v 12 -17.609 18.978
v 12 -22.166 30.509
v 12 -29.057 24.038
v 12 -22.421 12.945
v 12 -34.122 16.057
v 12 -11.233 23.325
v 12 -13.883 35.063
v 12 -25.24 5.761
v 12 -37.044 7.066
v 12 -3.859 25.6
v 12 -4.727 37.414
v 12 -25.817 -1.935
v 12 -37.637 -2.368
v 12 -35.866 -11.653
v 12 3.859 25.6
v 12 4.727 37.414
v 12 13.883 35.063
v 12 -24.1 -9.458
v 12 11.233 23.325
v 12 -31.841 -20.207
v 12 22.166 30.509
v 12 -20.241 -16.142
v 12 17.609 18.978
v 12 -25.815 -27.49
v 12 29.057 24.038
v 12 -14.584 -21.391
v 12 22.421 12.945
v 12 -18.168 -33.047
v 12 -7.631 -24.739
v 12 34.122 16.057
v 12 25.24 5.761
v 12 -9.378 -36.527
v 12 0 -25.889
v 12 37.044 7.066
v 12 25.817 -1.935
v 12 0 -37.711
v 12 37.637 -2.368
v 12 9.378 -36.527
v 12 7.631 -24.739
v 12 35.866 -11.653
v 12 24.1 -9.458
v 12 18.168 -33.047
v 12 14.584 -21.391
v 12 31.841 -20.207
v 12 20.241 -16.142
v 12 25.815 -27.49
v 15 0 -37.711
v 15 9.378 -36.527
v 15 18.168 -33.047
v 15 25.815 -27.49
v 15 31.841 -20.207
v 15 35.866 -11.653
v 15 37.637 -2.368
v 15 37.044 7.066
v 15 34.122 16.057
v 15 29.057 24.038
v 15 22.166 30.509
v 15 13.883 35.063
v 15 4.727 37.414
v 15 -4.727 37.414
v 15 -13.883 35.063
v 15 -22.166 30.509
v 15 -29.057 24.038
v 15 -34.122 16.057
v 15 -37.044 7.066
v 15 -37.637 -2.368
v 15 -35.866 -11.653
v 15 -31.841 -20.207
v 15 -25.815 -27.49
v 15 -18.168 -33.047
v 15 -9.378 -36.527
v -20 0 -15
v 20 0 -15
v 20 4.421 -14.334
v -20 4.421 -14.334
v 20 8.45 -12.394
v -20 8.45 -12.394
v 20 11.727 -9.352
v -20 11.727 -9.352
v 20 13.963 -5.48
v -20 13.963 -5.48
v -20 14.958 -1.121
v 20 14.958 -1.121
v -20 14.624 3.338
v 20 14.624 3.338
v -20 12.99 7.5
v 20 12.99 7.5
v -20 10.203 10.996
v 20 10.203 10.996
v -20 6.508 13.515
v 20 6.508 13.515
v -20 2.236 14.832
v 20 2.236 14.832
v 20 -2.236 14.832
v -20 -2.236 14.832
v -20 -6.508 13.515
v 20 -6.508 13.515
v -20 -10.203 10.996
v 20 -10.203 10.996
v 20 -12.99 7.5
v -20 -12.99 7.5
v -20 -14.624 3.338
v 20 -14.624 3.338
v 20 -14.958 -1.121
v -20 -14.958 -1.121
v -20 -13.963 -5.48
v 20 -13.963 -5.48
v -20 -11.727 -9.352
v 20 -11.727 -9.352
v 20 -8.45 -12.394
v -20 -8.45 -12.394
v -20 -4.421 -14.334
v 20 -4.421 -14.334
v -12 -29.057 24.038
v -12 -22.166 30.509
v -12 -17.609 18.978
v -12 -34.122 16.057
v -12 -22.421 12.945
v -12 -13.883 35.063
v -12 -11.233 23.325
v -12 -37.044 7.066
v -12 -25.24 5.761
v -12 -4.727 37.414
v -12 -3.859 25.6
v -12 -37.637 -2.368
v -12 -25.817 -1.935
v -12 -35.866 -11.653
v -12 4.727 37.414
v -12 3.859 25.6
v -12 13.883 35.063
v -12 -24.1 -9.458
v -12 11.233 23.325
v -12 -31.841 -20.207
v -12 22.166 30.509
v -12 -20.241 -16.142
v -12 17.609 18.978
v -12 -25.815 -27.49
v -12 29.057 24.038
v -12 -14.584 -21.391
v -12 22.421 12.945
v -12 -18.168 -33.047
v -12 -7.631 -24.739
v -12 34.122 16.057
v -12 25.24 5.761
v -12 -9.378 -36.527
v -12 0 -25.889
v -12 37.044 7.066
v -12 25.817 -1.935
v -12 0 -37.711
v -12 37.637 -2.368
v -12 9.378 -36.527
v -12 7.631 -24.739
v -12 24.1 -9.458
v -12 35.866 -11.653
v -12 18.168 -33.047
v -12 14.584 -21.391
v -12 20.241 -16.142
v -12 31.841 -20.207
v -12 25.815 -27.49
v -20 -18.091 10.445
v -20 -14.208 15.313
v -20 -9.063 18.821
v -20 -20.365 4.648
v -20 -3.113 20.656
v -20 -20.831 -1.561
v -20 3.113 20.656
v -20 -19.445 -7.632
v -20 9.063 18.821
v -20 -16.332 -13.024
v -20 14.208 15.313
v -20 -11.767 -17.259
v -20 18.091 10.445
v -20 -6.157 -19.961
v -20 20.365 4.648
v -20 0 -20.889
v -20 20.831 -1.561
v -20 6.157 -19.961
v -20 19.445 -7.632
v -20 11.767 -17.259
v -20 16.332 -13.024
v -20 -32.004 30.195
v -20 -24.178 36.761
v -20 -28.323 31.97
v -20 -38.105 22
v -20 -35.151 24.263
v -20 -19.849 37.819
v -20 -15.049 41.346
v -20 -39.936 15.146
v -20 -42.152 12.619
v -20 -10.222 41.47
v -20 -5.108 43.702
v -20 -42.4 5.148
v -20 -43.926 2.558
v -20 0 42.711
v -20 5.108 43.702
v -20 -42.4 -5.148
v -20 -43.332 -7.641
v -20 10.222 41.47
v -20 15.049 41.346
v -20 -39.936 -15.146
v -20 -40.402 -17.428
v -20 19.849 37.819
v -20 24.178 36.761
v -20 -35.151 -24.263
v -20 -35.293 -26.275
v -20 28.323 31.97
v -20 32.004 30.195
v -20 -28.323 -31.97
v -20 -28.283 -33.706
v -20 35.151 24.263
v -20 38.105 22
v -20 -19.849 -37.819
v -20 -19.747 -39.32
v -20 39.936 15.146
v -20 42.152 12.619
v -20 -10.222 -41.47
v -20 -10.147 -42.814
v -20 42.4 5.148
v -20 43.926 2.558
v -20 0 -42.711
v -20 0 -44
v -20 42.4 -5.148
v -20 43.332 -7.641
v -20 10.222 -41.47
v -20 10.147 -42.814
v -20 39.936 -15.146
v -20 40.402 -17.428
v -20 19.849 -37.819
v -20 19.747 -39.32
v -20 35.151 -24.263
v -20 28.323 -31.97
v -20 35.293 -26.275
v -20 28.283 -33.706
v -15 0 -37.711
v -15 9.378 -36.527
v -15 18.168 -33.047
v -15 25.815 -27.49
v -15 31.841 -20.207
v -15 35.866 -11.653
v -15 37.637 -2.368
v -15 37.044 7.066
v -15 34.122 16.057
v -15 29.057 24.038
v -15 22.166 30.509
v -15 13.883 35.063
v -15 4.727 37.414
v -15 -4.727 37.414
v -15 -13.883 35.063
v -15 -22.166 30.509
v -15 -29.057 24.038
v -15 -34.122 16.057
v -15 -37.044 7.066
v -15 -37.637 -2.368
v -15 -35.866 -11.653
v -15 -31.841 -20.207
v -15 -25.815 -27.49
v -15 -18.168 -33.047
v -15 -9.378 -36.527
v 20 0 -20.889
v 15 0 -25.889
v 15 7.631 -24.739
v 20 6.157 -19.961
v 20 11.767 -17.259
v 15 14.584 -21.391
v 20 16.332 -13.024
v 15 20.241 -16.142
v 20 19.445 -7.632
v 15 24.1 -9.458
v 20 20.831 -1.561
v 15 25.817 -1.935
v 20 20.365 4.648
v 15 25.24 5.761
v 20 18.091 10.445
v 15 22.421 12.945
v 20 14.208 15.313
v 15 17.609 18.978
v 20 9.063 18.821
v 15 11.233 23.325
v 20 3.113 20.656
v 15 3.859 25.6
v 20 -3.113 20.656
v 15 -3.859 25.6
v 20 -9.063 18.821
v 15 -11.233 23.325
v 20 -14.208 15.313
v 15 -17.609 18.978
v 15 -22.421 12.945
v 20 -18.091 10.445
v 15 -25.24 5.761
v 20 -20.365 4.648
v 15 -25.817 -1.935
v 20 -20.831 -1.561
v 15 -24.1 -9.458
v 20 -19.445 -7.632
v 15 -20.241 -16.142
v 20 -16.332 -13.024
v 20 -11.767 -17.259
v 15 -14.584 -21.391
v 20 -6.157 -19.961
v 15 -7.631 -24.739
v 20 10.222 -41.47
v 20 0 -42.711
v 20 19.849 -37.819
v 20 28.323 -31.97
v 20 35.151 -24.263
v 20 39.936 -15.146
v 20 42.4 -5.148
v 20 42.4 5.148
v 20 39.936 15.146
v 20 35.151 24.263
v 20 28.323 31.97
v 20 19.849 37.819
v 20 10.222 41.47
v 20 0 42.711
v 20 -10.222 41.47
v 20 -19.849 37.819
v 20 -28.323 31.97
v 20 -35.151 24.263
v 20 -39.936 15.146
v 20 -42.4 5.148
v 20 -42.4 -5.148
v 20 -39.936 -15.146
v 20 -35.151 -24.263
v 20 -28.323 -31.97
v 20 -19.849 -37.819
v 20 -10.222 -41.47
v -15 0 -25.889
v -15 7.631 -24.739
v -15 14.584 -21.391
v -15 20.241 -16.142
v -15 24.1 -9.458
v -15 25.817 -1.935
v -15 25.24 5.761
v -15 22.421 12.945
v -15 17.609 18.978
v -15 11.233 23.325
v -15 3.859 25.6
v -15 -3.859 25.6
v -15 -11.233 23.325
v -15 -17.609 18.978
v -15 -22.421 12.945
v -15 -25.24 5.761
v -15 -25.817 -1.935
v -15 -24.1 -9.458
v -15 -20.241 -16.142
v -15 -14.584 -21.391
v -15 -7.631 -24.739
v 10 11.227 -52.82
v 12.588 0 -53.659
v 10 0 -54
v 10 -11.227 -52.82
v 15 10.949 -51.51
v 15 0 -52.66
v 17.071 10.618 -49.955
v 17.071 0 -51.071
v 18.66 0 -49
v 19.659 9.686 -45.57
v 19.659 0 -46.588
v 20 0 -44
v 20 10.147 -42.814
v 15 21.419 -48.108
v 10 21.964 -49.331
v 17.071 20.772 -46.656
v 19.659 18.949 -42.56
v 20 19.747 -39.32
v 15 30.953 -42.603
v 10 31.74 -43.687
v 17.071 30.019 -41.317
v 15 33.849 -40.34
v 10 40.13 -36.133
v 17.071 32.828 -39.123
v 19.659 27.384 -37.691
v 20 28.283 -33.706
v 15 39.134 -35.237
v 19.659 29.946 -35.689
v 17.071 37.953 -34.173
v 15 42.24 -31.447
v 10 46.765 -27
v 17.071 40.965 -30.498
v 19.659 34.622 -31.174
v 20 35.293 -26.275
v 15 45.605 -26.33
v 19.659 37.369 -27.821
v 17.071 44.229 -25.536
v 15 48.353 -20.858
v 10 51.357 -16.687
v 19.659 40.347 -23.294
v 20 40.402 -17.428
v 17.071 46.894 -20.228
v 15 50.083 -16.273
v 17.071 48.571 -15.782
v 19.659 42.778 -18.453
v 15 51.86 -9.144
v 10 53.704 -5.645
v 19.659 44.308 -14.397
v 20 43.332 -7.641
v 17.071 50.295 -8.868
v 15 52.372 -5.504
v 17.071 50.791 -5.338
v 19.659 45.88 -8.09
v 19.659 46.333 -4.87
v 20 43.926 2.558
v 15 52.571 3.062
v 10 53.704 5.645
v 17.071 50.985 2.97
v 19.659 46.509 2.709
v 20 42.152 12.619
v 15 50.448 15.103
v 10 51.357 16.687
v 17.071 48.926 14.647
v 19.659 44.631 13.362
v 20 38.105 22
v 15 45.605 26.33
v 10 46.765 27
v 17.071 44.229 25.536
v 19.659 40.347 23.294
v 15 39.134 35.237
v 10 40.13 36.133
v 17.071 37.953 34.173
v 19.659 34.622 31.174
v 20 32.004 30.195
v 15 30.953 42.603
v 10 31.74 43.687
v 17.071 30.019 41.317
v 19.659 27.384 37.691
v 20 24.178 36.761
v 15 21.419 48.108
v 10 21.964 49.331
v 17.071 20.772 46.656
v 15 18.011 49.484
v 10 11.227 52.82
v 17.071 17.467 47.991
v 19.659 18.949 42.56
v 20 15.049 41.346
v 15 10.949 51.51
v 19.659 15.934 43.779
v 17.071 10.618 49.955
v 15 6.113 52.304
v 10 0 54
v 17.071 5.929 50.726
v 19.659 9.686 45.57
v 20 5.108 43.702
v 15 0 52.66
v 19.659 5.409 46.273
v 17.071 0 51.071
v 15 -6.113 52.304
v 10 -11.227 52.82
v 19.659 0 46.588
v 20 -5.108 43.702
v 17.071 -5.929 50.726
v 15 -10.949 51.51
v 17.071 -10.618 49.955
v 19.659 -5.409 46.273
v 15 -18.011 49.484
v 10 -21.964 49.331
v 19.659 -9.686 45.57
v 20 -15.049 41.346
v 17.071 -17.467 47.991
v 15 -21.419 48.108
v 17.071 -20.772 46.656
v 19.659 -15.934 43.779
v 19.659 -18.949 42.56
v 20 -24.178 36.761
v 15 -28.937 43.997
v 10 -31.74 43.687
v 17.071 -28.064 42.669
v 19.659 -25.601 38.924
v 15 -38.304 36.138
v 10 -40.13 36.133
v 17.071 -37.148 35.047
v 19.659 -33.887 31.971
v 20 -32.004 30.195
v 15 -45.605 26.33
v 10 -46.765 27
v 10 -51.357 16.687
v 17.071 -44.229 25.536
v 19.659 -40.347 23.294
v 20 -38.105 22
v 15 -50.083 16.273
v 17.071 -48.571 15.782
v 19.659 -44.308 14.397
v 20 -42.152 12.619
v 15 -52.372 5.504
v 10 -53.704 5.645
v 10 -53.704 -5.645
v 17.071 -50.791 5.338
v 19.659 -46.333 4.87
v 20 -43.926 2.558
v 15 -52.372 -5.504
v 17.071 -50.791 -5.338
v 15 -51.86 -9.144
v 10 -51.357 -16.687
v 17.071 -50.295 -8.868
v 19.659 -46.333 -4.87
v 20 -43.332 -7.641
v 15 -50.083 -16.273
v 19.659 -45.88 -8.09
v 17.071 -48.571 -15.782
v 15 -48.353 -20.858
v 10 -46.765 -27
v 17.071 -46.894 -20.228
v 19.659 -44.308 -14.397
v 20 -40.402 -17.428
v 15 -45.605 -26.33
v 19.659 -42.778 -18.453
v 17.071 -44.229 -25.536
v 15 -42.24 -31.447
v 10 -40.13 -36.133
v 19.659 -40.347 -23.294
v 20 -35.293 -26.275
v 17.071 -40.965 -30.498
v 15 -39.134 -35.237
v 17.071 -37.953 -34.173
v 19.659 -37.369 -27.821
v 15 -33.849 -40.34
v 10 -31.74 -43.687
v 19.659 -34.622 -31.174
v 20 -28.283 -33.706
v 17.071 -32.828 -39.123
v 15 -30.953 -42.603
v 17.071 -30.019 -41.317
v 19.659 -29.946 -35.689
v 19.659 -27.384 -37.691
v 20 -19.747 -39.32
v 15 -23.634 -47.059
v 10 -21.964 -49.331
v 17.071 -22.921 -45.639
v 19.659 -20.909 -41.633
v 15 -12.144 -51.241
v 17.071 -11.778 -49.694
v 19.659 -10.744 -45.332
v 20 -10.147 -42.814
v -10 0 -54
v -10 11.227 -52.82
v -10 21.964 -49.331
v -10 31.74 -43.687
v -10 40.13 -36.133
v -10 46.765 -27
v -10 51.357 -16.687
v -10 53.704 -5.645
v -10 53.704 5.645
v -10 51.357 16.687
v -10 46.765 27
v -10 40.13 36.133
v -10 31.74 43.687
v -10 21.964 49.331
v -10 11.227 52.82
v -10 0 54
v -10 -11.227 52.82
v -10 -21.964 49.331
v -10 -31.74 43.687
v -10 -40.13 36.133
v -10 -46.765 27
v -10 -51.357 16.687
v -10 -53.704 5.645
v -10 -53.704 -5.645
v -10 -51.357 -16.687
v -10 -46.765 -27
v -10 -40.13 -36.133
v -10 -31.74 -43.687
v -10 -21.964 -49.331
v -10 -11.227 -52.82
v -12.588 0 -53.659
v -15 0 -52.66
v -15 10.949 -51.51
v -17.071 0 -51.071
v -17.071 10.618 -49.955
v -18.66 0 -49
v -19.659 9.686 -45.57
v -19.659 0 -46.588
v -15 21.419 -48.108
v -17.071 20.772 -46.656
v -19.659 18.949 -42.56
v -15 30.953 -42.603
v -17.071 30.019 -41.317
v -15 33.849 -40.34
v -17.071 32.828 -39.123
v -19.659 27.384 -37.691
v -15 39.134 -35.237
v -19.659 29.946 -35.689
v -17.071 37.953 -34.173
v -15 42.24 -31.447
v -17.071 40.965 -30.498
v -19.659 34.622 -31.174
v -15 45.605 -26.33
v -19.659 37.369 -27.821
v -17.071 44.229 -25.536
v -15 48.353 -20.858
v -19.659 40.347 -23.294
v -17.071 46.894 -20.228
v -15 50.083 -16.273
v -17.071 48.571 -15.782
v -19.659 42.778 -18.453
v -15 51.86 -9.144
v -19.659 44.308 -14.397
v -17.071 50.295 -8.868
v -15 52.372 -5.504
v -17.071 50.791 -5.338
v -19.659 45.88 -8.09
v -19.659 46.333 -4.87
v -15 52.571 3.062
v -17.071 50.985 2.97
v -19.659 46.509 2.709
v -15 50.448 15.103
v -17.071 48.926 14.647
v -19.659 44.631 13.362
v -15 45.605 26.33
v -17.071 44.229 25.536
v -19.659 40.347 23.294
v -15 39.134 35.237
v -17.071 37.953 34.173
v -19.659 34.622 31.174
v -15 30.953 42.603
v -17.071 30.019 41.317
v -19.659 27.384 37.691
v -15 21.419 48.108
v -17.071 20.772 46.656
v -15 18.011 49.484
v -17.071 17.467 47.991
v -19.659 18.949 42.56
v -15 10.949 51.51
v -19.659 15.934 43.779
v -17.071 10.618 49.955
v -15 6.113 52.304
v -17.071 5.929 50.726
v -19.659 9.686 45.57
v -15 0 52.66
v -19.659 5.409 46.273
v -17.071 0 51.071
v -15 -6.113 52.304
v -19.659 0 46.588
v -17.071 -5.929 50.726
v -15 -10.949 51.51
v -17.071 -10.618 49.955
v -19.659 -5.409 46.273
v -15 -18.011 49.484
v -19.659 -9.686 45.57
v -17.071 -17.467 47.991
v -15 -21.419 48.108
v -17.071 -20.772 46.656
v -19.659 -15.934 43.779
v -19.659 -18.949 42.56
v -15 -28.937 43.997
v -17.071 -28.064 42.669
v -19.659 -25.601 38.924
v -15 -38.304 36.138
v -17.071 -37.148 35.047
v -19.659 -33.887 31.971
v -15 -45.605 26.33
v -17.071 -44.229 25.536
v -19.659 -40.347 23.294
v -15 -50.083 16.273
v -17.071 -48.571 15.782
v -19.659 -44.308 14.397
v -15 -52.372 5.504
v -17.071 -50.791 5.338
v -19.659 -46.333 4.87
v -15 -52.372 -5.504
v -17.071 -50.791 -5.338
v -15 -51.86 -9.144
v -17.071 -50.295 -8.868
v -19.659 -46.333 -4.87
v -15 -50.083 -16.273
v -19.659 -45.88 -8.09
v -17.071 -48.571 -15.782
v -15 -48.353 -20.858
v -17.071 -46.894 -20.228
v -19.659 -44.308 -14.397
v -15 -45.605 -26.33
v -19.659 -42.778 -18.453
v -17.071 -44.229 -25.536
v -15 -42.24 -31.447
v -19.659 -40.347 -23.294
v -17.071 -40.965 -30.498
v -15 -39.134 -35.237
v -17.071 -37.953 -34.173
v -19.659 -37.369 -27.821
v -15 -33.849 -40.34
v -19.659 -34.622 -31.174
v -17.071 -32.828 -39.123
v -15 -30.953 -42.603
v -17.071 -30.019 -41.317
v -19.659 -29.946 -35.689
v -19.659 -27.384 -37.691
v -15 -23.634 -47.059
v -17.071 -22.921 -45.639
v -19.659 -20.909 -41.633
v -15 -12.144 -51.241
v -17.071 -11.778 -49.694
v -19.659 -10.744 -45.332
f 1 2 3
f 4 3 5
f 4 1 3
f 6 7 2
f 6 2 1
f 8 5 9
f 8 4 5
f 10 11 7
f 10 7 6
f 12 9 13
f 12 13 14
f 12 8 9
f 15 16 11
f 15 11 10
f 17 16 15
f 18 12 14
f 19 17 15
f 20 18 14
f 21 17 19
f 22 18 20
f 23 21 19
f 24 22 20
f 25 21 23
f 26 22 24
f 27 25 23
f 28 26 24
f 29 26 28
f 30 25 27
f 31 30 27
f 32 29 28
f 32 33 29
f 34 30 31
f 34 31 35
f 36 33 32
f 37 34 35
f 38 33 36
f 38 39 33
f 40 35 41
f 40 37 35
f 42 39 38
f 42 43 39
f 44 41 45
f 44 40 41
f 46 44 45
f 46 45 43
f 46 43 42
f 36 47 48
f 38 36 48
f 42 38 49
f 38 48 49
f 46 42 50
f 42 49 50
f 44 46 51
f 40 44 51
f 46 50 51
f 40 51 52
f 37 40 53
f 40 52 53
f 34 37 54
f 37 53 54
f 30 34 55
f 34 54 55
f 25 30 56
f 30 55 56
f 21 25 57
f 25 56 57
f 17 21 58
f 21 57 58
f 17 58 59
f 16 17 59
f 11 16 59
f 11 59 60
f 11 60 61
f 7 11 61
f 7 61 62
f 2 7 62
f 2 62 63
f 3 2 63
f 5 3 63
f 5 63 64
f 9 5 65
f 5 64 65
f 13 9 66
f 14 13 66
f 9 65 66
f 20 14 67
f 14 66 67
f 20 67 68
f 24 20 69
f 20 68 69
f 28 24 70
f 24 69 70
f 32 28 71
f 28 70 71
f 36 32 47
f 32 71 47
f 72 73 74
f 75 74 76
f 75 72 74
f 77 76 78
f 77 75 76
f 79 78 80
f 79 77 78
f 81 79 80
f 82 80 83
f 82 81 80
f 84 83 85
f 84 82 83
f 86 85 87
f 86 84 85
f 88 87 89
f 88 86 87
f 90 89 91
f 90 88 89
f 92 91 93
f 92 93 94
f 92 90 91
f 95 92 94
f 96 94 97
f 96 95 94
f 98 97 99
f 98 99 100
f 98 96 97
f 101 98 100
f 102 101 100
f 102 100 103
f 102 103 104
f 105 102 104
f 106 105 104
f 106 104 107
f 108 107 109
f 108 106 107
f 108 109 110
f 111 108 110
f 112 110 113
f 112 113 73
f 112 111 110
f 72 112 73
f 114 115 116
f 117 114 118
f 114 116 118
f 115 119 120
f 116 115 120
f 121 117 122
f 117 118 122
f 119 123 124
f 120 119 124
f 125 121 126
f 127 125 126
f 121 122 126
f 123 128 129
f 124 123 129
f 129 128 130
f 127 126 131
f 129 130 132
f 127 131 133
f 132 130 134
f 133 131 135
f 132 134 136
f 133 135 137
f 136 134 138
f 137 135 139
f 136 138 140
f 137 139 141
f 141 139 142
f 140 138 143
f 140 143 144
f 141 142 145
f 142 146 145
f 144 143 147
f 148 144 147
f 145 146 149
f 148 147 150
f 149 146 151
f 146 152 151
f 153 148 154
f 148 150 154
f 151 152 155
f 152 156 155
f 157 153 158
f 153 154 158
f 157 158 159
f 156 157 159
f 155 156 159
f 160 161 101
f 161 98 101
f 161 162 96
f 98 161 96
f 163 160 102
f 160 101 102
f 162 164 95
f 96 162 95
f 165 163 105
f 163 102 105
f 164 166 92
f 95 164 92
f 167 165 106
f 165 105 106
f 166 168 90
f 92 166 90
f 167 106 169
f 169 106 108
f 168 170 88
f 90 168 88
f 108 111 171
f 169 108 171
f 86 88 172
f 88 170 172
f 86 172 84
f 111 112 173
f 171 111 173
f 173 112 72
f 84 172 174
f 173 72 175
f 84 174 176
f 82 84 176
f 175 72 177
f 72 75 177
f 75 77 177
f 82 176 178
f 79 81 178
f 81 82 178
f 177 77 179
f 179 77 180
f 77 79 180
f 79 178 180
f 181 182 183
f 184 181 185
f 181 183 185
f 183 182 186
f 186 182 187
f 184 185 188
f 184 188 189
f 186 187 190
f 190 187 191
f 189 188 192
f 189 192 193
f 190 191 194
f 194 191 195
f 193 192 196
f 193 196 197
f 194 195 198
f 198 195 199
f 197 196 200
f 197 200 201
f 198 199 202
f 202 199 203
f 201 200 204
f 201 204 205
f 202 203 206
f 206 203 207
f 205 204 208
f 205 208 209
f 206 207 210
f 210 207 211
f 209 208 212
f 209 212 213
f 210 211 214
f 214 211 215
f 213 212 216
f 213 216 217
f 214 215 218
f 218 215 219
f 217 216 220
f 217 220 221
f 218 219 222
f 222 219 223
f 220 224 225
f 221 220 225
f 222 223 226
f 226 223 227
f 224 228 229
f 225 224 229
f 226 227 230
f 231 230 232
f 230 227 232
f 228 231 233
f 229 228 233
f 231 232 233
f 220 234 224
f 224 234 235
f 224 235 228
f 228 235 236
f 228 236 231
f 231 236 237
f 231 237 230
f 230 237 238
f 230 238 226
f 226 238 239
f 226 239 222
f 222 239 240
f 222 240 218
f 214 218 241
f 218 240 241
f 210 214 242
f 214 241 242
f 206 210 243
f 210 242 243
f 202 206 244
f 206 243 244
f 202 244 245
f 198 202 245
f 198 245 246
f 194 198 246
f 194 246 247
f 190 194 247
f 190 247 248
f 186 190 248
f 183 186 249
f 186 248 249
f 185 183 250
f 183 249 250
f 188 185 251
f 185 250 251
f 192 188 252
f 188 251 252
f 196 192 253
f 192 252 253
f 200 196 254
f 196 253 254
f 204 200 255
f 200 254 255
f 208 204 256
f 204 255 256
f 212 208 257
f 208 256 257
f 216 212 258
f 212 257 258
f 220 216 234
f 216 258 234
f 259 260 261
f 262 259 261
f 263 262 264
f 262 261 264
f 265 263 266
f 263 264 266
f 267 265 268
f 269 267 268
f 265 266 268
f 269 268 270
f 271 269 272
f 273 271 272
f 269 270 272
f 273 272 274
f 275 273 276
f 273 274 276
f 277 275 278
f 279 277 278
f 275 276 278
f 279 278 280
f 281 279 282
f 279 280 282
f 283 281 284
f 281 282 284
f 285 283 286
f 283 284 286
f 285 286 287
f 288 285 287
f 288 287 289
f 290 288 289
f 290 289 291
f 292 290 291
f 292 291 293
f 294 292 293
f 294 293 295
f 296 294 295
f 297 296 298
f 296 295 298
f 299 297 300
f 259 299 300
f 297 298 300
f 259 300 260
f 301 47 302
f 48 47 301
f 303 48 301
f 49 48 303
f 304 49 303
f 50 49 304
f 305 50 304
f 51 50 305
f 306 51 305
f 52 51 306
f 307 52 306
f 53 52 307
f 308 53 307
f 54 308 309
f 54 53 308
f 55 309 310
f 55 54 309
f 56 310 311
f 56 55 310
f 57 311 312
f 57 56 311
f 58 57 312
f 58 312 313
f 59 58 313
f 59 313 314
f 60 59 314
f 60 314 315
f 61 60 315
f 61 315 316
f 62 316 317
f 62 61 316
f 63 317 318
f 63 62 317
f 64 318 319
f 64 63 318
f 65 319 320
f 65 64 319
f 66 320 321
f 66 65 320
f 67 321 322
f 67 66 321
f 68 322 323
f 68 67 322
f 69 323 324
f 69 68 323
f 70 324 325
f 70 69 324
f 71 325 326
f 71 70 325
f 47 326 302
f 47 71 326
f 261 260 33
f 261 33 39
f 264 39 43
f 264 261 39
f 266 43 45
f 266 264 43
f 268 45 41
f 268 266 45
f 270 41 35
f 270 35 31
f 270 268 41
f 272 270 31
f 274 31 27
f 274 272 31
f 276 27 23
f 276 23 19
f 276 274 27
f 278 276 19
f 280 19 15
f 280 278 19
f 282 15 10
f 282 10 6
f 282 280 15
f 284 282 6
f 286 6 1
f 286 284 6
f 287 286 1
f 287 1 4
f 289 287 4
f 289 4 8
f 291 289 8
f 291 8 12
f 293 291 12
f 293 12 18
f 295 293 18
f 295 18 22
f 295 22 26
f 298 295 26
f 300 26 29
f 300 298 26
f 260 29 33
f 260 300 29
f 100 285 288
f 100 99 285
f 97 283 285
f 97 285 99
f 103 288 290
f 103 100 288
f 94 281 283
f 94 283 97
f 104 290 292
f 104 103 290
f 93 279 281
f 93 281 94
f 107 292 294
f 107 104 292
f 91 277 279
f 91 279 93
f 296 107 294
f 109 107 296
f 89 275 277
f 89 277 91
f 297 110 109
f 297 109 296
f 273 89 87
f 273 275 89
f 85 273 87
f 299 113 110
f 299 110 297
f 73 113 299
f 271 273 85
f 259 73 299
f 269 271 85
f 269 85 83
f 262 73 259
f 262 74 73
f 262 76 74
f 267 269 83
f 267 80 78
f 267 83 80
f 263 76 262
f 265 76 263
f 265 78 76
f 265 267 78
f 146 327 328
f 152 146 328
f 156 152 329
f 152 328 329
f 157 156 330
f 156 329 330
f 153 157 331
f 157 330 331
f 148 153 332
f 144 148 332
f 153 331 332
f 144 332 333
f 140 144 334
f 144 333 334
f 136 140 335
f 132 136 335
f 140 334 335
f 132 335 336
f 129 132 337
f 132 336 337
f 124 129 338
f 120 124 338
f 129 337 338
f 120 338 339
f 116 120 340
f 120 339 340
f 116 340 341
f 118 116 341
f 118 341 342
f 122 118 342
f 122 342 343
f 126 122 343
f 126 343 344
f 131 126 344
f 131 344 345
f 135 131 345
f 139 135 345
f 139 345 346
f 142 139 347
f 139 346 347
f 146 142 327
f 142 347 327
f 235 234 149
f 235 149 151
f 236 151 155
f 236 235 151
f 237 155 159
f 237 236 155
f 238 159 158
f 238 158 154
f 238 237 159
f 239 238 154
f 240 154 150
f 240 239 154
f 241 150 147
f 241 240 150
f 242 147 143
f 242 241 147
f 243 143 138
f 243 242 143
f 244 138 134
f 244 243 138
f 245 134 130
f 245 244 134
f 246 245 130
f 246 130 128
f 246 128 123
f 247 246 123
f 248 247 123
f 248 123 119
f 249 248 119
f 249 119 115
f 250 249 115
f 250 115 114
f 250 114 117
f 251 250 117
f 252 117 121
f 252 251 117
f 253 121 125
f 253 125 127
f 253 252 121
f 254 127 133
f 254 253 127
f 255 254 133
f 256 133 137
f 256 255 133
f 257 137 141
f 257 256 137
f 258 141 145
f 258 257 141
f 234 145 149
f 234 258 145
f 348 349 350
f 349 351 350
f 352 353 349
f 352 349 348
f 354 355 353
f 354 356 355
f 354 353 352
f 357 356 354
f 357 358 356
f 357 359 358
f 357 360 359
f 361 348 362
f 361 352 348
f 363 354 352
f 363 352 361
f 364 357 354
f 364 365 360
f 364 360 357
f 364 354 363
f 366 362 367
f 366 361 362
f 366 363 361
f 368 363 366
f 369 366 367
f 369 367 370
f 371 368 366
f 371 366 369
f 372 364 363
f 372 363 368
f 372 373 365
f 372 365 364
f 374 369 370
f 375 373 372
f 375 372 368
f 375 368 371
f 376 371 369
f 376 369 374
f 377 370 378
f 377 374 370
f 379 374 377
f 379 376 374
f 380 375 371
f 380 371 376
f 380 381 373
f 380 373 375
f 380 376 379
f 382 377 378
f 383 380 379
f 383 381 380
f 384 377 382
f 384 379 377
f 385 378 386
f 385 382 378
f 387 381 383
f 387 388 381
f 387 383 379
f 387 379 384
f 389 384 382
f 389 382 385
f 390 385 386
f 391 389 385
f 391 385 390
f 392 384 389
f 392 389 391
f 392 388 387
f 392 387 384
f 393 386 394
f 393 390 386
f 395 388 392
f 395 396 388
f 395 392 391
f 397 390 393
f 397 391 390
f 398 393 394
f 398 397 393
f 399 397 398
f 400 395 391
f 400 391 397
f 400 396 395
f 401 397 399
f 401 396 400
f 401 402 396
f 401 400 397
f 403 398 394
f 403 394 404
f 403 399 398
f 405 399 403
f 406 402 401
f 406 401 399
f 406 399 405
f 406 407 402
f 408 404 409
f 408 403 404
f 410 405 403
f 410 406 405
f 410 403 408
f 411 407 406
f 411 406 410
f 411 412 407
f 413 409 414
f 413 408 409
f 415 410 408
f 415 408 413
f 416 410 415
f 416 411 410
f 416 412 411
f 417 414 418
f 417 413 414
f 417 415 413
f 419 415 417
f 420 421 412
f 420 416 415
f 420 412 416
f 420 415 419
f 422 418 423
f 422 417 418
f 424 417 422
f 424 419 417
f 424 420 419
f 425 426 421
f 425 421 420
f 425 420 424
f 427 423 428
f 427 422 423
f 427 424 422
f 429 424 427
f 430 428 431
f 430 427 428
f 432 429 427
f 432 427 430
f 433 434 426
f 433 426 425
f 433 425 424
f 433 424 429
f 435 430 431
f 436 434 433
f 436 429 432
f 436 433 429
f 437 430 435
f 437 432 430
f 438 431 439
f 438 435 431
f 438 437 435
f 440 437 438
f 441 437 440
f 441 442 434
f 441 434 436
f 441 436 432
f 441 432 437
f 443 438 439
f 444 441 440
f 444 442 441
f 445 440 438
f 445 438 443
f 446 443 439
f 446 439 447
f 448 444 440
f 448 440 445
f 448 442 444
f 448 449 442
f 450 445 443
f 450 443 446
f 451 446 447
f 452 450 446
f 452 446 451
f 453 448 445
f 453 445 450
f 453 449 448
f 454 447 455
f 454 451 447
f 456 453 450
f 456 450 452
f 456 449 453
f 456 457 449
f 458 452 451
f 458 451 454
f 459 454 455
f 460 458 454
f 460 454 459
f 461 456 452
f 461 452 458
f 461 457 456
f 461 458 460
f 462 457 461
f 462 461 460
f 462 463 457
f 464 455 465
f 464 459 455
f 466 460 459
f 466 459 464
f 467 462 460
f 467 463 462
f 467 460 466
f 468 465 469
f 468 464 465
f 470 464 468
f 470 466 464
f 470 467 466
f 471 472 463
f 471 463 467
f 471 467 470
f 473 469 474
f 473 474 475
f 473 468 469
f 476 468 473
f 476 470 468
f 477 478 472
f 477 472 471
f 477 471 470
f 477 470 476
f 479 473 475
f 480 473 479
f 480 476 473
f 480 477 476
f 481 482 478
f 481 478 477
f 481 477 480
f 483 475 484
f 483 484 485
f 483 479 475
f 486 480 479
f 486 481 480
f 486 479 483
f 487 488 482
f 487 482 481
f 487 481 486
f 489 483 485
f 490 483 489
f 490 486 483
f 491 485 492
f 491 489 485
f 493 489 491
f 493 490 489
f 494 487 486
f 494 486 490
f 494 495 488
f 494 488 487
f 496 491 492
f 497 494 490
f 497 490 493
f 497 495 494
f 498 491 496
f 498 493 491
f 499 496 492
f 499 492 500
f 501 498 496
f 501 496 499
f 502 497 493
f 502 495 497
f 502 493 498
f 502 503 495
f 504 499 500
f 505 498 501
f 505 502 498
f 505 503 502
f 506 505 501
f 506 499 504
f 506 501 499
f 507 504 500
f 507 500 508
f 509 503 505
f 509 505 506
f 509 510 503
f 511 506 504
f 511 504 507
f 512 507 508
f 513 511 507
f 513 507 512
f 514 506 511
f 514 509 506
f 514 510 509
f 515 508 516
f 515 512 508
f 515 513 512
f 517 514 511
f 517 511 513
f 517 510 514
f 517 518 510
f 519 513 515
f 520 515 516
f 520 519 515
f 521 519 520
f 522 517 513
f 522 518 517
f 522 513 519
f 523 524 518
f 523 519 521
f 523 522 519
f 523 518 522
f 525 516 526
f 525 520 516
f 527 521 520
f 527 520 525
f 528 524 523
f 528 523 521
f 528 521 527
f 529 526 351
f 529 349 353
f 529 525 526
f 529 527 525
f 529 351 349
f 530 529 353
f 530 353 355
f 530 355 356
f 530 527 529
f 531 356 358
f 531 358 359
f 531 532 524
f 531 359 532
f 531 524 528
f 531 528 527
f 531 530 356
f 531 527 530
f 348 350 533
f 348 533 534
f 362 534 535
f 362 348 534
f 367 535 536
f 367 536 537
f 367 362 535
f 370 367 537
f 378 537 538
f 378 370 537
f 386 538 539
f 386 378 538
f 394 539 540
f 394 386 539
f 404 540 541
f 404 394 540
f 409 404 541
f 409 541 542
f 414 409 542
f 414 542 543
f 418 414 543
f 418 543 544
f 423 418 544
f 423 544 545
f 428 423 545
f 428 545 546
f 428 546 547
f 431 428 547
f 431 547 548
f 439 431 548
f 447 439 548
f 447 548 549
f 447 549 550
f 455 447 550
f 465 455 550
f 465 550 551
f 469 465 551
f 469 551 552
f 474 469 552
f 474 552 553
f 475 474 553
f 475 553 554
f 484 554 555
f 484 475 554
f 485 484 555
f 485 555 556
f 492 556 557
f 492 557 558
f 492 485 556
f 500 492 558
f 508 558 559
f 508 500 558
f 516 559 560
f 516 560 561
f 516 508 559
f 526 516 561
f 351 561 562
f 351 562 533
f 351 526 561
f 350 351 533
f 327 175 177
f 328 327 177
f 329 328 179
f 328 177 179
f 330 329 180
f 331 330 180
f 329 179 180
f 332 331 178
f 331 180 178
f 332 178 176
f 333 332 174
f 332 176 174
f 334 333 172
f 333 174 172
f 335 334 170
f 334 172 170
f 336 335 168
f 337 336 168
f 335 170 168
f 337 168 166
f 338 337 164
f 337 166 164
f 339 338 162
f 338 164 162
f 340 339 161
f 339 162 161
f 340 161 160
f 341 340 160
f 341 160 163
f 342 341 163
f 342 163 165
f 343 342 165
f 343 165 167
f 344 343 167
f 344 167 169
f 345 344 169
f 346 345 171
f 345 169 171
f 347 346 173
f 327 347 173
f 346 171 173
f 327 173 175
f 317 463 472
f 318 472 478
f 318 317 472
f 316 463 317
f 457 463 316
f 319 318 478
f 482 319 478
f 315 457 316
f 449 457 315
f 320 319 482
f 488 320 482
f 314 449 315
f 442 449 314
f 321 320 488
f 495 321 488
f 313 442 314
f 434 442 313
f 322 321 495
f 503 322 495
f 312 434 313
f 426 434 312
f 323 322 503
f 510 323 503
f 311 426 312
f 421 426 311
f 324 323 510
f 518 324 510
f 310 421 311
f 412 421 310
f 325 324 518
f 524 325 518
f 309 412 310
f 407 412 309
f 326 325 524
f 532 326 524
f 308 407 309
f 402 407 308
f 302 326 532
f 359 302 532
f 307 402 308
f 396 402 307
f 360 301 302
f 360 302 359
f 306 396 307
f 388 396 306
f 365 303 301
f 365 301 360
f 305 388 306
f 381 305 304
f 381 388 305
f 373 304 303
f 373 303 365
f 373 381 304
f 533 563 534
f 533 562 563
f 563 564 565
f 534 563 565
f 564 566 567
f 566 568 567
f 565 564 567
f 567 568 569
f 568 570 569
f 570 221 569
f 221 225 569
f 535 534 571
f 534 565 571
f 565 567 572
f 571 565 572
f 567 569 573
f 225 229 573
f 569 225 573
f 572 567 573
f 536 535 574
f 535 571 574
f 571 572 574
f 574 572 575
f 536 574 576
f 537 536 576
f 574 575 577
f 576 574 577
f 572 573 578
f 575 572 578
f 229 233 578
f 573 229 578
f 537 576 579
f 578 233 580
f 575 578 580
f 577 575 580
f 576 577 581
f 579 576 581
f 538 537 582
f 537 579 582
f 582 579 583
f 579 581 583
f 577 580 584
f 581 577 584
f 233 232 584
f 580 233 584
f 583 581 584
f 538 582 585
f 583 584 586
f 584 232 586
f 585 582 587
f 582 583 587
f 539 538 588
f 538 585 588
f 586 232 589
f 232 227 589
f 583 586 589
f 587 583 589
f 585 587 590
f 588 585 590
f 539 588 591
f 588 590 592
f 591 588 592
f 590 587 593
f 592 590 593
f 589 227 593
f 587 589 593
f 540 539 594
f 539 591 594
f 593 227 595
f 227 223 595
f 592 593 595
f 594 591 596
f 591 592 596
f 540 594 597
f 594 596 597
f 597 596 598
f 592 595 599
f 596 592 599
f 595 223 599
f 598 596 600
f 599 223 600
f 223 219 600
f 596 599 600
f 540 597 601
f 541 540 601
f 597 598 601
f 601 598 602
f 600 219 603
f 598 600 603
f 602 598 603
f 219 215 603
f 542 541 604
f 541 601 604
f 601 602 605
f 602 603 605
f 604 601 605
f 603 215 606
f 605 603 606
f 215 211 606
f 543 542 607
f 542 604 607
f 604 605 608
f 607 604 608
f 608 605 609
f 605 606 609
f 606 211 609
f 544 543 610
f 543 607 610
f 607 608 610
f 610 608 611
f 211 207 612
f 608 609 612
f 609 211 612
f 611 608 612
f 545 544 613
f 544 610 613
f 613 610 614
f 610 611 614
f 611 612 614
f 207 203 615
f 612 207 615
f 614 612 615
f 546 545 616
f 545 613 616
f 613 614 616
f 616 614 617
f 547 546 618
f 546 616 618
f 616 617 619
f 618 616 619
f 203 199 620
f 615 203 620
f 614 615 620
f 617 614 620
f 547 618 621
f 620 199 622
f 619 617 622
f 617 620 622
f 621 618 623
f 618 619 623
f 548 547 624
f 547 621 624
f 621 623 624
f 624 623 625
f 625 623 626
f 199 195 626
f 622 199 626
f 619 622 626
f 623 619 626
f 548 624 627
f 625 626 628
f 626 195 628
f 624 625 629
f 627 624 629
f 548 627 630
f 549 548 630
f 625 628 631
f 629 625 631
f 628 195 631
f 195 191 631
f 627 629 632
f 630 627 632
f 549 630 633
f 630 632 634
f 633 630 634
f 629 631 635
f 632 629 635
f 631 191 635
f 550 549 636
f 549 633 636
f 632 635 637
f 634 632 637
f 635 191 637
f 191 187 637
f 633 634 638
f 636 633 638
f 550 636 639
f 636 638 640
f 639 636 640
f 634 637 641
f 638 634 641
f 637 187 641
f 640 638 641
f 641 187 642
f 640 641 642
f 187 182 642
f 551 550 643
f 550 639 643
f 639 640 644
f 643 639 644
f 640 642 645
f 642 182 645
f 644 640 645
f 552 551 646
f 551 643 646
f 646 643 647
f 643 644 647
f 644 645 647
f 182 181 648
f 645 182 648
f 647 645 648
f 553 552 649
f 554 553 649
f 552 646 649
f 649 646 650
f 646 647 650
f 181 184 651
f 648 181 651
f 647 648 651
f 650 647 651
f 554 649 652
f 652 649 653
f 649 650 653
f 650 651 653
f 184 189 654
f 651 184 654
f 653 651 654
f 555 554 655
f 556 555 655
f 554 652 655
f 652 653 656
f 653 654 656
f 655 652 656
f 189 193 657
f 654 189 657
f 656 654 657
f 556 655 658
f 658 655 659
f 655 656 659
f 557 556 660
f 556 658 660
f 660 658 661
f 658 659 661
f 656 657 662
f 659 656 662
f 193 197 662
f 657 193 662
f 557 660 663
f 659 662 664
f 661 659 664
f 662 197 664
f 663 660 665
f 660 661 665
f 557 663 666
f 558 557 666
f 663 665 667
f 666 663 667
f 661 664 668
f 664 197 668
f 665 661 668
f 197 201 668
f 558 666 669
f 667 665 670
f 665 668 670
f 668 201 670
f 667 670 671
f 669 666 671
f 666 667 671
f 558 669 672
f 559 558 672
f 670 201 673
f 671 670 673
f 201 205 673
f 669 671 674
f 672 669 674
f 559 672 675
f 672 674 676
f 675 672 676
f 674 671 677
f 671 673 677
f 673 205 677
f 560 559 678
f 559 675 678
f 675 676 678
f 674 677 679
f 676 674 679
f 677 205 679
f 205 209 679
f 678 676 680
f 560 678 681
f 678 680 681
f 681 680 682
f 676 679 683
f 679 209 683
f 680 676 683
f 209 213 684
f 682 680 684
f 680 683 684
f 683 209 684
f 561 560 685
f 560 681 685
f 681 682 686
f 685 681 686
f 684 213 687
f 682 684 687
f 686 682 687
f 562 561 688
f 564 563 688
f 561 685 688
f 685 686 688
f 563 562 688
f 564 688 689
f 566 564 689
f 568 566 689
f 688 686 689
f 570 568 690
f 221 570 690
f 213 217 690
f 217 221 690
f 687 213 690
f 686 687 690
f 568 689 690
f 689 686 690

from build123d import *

# Parameters (mm, degrees)
SKETCH_1_R                 = 54
SKETCH_1_R_2               = 15
EXTRUDE_1_DEPTH            = 20
FILLET_1_R                 = 10
SKETCH_2_R                 = 37.711489045
SKETCH_2_R_2               = 25.889208159
CUT_EXTRUDE_1_DEPTH        = 8
CHAMFER_1_SIZE             = 5
CHAMFER_1_OF_MIRROR_4_SIZE = 5


with BuildPart() as part:
    # 草图1 → 凸台-拉伸1 (new, symmetric)
    with BuildSketch(Plane(origin=(0, 0, 0), x_dir=(0, 0, -1), z_dir=(1, 0, 0))):
        Circle(SKETCH_1_R)
        Circle(SKETCH_1_R_2, mode=Mode.SUBTRACT)
    extrude(amount=EXTRUDE_1_DEPTH, both=True)

    # 圆角1
    fillet_1_edges = [part.edges().sort_by_distance(p)[0] for p in [
        (-20, 0, 54),
        (20, 0, 54),
    ]]
    fillet(fillet_1_edges, radius=FILLET_1_R)

    # 草图2 → 切除-拉伸1 (cut)
    with BuildSketch(Plane(origin=(20, 0, 0), x_dir=(0, 0, -1), z_dir=(1, 0, 0))):
        Circle(SKETCH_2_R)
        Circle(SKETCH_2_R_2, mode=Mode.SUBTRACT)
    cut_extrude_1 = extrude(amount=-CUT_EXTRUDE_1_DEPTH, mode=Mode.SUBTRACT)

    # 倒角1
    chamfer_1_edges = [part.edges().sort_by_distance(p)[0] for p in [
        (20, 0, 37.711489045),
        (20, 0, 25.889208159),
    ]]
    chamfer(chamfer_1_edges, length=CHAMFER_1_SIZE)

    # 镜向4: 切除-拉伸1 across plane
    add(cut_extrude_1.mirror(Plane(origin=(0, 0, 0), x_dir=(0, 0, 1), z_dir=(1, 0, 0))), mode=Mode.SUBTRACT)

    # 倒角1 of 镜向4
    chamfer_1_of_mirror_4_edges = [part.edges().sort_by_distance(p)[0] for p in [
        (-20, 0, 37.711489045),
        (-20, 0, 25.889208159),
    ]]
    chamfer(chamfer_1_of_mirror_4_edges, length=CHAMFER_1_OF_MIRROR_4_SIZE)


solid = part.part
